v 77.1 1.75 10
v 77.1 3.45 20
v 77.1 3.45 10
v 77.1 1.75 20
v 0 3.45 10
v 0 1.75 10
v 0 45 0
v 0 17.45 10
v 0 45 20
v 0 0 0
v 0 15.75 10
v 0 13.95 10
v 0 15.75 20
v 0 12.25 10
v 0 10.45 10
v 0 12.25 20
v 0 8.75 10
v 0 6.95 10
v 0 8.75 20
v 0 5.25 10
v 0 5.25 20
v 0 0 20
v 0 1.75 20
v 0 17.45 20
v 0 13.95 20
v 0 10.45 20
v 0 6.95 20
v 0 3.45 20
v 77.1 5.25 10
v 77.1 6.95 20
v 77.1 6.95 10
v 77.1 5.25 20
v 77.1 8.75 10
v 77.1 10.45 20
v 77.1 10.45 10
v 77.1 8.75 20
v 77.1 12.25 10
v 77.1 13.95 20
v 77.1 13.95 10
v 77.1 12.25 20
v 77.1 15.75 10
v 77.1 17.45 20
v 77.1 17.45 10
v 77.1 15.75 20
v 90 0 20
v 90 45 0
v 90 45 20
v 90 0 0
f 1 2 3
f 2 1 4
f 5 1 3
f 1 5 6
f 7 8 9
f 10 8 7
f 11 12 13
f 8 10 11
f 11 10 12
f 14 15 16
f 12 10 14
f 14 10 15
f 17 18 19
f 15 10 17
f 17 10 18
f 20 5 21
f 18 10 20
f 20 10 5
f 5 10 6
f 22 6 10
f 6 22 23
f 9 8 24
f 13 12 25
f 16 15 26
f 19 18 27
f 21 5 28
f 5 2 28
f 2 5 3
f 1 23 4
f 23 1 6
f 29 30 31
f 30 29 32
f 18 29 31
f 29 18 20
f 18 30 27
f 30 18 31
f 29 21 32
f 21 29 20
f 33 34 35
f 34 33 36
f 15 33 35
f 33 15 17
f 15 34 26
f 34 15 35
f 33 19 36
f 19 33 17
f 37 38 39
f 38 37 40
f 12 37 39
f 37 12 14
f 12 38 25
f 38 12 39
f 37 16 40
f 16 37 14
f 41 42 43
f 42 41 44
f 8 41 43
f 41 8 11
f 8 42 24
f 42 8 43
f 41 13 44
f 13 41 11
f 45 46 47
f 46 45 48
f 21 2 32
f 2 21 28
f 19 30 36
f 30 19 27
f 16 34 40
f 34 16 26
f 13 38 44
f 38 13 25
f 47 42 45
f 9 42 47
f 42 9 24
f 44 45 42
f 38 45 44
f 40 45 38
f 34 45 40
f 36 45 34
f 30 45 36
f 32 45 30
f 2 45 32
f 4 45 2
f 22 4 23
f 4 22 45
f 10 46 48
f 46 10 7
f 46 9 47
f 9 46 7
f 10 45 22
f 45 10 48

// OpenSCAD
// Drying Rack for Microscope Slides
// Base: 90 x 45 x 20 mm
// Slots: 10 parallel slots for 75x25mm slides
// Orientation: Rests on XY plane at Z=0, builds upward.

// Base Dimensions
$base_length = 90;   // X
$base_width = 45;    // Y
$base_height = 20;   // Z

// Slide Dimensions (for reference)
$slide_length = 75;  // X
$slide_width = 25;   // Y
$slide_thickness = 1; // Z

// Slot Dimensions
$num_slots = 10;
$slot_length = 77;   // X (slightly longer than slide to allow insertion)
$slot_width = 1.6;   // Y
$slot_depth = 10;    // Z (depth of cut from top)

// Spacing
$slot_spacing = 3.5; // Centre-to-centre distance in Y

// Global settings for smooth curves
$fn = 64;

// Calculate position of the first slot center in Y
// The group of slots is centred on the block in Y.
// Total width occupied by slots and gaps = num_slots * slot_width + (num_slots - 1) * slot_spacing
// However, we are given centre-to-centre spacing.
// Let's calculate the offset from the block center to the first slot center.
// The centers are at: -Y_offset, -Y_offset + slot_spacing, ..., +Y_offset
// The distance from center to the last slot center is (num_slots - 1) * slot_spacing / 2
$y_offset_from_center = (($num_slots - 1) * $slot_spacing) / 2;

// Generate the base block
difference() {
    // Main Block
    cube([
        $base_length, 
        $base_width, 
        $base_height
    ]);

    // Cut Slots
    // We iterate through each slot. 
    // Slot centers in Y range from -y_offset_from_center to +y_offset_from_center
    for (i = [0 : $num_slots - 1]) {
        // Calculate Y position for this slot
        $current_y = -($y_offset_from_center) + (i * $slot_spacing);
        
        // Define the slot geometry
        // The slot is a rectangular prism cut from the top face.
        // It runs along X (length $slot_length), is wide in Y ($slot_width), 
        // and deep in Z ($slot_depth).
        // Position: Z starts at ($base_height - $slot_depth) and goes up to $base_height.
        
        translate([
            0,              // X center (slots are centred on block in X)
            $current_y,     // Y position
            $base_height - $slot_depth // Z start position
        ]) {
            // Extend slightly past the faces to ensure clean cut
            cube([
                $slot_length + 0.1, 
                $slot_width + 0.1, 
                $slot_depth + 0.1
            ]);
        }
    }
}
